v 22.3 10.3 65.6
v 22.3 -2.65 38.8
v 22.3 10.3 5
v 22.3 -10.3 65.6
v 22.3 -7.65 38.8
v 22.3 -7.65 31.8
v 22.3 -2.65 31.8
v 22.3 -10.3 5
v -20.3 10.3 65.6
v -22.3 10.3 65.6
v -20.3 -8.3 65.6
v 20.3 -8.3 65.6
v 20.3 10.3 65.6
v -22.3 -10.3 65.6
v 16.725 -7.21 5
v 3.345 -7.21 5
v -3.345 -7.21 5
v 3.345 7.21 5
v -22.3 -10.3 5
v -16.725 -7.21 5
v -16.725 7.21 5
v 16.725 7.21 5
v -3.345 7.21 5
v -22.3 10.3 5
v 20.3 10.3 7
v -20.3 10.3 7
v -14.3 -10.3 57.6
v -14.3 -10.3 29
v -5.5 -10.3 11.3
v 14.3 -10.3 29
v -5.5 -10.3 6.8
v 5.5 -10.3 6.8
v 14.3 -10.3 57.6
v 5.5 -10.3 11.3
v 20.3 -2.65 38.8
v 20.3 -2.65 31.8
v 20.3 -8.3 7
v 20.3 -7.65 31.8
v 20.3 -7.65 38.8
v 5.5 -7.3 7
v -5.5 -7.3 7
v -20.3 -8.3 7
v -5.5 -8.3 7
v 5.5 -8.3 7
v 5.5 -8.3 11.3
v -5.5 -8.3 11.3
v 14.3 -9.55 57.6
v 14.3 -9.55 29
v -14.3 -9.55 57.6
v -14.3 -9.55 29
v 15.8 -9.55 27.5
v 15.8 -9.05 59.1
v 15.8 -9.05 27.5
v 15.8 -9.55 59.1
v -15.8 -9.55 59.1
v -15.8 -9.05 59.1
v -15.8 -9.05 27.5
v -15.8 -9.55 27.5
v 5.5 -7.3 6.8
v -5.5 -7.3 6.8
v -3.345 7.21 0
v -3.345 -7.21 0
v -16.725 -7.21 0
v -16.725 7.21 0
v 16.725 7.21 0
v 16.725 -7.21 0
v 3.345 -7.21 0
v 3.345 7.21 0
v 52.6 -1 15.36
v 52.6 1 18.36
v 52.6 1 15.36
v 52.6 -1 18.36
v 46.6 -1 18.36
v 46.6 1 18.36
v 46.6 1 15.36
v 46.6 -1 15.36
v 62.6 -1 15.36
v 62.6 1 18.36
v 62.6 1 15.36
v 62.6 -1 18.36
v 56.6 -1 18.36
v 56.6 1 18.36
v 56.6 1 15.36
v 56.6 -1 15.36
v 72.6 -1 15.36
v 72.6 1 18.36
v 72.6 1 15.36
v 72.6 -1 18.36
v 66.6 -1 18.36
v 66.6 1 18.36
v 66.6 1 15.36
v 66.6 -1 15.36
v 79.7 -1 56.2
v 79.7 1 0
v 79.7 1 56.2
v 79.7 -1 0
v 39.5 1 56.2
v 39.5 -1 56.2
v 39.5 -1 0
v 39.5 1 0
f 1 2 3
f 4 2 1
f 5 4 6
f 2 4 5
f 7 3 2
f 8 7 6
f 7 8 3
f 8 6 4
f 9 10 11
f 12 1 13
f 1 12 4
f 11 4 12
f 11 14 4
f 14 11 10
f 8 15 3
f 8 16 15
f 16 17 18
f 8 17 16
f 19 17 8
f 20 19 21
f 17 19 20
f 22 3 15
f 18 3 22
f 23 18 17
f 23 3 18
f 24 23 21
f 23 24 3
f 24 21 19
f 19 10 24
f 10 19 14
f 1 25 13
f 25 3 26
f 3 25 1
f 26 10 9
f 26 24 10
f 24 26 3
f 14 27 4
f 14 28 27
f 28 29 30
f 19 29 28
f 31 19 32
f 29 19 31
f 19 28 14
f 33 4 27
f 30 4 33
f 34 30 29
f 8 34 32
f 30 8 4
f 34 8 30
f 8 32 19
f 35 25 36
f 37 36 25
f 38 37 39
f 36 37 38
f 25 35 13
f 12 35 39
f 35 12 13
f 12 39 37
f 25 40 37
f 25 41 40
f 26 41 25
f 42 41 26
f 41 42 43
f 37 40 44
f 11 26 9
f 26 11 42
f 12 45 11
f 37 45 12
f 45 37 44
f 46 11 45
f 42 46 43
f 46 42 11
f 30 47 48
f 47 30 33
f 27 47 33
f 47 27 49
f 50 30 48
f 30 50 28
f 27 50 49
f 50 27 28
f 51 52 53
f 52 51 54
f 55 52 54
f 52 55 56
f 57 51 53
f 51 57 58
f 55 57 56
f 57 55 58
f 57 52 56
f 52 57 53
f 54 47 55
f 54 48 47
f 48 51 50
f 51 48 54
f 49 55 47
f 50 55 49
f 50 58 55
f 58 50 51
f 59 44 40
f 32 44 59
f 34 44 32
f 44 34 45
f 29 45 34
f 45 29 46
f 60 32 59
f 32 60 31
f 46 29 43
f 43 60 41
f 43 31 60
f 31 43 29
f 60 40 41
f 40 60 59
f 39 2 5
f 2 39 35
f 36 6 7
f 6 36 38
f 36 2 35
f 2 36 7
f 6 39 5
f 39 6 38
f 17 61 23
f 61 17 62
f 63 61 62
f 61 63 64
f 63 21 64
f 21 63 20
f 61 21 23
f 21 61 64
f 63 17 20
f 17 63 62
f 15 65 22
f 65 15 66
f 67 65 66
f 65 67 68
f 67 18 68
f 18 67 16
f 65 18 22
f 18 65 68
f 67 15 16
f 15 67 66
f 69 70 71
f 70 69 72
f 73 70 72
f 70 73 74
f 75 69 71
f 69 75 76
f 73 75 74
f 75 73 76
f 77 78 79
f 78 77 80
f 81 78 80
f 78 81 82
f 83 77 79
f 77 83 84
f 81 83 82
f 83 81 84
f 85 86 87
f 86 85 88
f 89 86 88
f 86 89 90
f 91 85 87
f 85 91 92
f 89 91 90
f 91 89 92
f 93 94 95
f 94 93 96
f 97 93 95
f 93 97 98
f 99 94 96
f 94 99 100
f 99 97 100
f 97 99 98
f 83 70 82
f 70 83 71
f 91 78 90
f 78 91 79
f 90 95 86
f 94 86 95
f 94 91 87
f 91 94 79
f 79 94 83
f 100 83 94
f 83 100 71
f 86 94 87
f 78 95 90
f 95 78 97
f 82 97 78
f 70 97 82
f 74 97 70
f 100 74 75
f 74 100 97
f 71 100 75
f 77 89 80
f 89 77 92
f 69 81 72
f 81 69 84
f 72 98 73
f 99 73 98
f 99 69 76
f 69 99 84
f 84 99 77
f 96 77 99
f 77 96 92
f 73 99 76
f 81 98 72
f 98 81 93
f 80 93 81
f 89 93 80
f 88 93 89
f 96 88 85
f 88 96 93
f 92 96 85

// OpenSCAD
// file: BOSL2/std.scad
// Minimal BOSL2 compatibility shim for bundled gallery models.
// It implements only the helpers used by the imported OpenSCAD projects.

CENTER = [0, 0, 0];
BOTTOM = [0, 0, -1];
TOP = [0, 0, 1];
LEFT = [-1, 0, 0];
RIGHT = [1, 0, 0];
FRONT = [0, -1, 0];
BACK = [0, 1, 0];

module up(z=0) {
    translate([0, 0, z]) children();
}

module down(z=0) {
    translate([0, 0, -z]) children();
}

module attach(anchor=CENTER) {
    children();
}

module cuboid(size=[1, 1, 1], anchor=CENTER) {
    center = anchor == CENTER;
    translate(center ? [0, 0, 0] : [0, 0, size[2] / 2])
        cube(size, center=true);
    children();
}

module xcyl(h=1, r=1, anchor=CENTER) {
    center = anchor == CENTER;
    translate(center ? [0, 0, 0] : [h / 2, 0, 0])
        rotate([0, 90, 0])
            cylinder(h=h, r=r, center=true);
}
// main file
include <BOSL2/std.scad>

// === DTMB Enclosure v2 ===
// Built directly around CoreInk reference dimensions
// Portrait: 40w x 56h x 16d (standing upright, screen facing you)

// --- CoreInk hardware (from reference) ---
hw_w = 40;     // width (X)
hw_h = 56;     // height (Z)
hw_d = 16;     // depth (Y)
hw_display_w = 27.6;
hw_display_h = 27.6;
hw_display_z = 36;    // display center from bottom of CoreInk
hw_usbc_w = 9;
hw_usbc_h = 3.5;
hw_dial_w = 10;
hw_dial_d = 4;
hw_side_btn_h = 6;
hw_side_btn_z = 28;   // from bottom of CoreInk

// --- Enclosure shell ---
wall = 2.0;
tol = 0.3;
corner_r = 6;

// --- Derived ---
enc_w = hw_w + 2*(wall + tol);
enc_h = hw_h + 2*(wall + tol);
enc_d = hw_d + 2*(wall + tol);

// --- Display cutout (slightly oversized for clearance) ---
disp_cut_w = hw_display_w + 1;
disp_cut_h = hw_display_h + 1;
disp_cut_z = wall + tol + hw_display_z;  // from bottom of enclosure

// --- Bezel ---
bezel_w = 1.5;
bezel_depth = 0.5;

// --- Feet ---
// Two stubby feet, like the concept image
// Each about 1/3 body width, flat bottom, rounded front
foot_w = enc_w * 0.3;
foot_d = enc_d * 0.7;
foot_h = 5;
foot_r = 2.5;
foot_gap = enc_w * 0.15;

// --- Branding ---
brand_text = "DTMB";
brand_size = 4.5;
brand_depth = 0.4;

// =====================
// FOOT
// =====================
module foot() {
    intersection() {
        // Rounded box, flat on bottom
        translate([0, 0, foot_h/2])
            cuboid([foot_w, foot_d, foot_h],
                   rounding=foot_r, edges=BOTTOM+LEFT+RIGHT+FRONT+BACK,
                   anchor=CENTER, $fn=24);
        // Trim to flat bottom
        translate([0, 0, foot_h])
            cube([foot_w + 1, foot_d + 1, foot_h*2], center=true);
    }
}

// =====================
// BODY SHELL
// =====================
module body_shell() {
    difference() {
        // Outer
        cuboid([enc_w, enc_d, enc_h],
               rounding=corner_r, edges="Z",
               anchor=BOTTOM);

        // Inner cavity (open from back, +Y)
        translate([0, wall, wall])
            cuboid([enc_w - 2*wall, enc_d, enc_h - wall],
                   rounding=max(corner_r - wall, 1), edges="Z",
                   anchor=BOTTOM);

        // Display window (front face = -Y)
        translate([0, -enc_d/2, disp_cut_z])
            cuboid([disp_cut_w, wall + 0.02, disp_cut_h],
                   anchor=CENTER);

        // Bezel recess
        translate([0, -enc_d/2 + wall/2, disp_cut_z])
            cuboid([disp_cut_w + 2*bezel_w, bezel_depth, disp_cut_h + 2*bezel_w],
                   rounding=1.5, edges="Y",
                   anchor=CENTER);

        // USB-C (bottom of front face)
        translate([0, -enc_d/2, wall + tol + hw_usbc_h/2])
            cuboid([hw_usbc_w + 2, wall*3, hw_usbc_h + 1],
                   rounding=1, edges="Y",
                   anchor=CENTER);

        // Top dial (top edge)
        translate([0, -enc_d/4, enc_h - wall/2])
            cuboid([hw_dial_w + 2, hw_dial_d + 2, wall + 0.02],
                   anchor=CENTER);

        // Side button (right, +X)
        translate([enc_w/2, -enc_d/4, wall + tol + hw_side_btn_z])
            cuboid([wall*3, hw_dial_d + 1, hw_side_btn_h + 1],
                   rounding=1, edges="X",
                   anchor=CENTER);

        // Back branding
        translate([0, enc_d/2 - 0.01, enc_h * 0.3])
            rotate([90, 0, 0])
                linear_extrude(brand_depth)
                    text(brand_text, size=brand_size, halign="center",
                         valign="center", font="Helvetica Neue:style=Light");
    }
}

// =====================
// BACK PLATE
// =====================
module back_plate() {
    bp_w = enc_w - 2*wall - 0.4;
    bp_h = enc_h - 2*wall - 0.4;
    difference() {
        cuboid([bp_w, wall, bp_h],
               rounding=max(corner_r - wall, 1), edges="Y",
               anchor=BOTTOM);
        for (i = [-1, 0, 1])
            translate([i * 10, 0, bp_h * 0.3])
                cuboid([6, wall + 0.02, 3],
                       rounding=1, edges="Y", anchor=CENTER);
    }
}

// =====================
// ASSEMBLY
// =====================

color("WhiteSmoke") {
    // Body on top of feet
    translate([0, 0, foot_h])
        body_shell();

    // Left foot
    translate([-(foot_gap/2 + foot_w/2), 0, 0])
        foot();
    // Right foot
    translate([(foot_gap/2 + foot_w/2), 0, 0])
        foot();
}

// Back plate (offset)
color("GhostWhite")
    translate([enc_w + 15, 0, 0])
        back_plate();

// Ghost CoreInk for reference
%translate([0, 0, foot_h + wall + tol + hw_h/2])
    cube([hw_w, hw_d, hw_h], center=true);
